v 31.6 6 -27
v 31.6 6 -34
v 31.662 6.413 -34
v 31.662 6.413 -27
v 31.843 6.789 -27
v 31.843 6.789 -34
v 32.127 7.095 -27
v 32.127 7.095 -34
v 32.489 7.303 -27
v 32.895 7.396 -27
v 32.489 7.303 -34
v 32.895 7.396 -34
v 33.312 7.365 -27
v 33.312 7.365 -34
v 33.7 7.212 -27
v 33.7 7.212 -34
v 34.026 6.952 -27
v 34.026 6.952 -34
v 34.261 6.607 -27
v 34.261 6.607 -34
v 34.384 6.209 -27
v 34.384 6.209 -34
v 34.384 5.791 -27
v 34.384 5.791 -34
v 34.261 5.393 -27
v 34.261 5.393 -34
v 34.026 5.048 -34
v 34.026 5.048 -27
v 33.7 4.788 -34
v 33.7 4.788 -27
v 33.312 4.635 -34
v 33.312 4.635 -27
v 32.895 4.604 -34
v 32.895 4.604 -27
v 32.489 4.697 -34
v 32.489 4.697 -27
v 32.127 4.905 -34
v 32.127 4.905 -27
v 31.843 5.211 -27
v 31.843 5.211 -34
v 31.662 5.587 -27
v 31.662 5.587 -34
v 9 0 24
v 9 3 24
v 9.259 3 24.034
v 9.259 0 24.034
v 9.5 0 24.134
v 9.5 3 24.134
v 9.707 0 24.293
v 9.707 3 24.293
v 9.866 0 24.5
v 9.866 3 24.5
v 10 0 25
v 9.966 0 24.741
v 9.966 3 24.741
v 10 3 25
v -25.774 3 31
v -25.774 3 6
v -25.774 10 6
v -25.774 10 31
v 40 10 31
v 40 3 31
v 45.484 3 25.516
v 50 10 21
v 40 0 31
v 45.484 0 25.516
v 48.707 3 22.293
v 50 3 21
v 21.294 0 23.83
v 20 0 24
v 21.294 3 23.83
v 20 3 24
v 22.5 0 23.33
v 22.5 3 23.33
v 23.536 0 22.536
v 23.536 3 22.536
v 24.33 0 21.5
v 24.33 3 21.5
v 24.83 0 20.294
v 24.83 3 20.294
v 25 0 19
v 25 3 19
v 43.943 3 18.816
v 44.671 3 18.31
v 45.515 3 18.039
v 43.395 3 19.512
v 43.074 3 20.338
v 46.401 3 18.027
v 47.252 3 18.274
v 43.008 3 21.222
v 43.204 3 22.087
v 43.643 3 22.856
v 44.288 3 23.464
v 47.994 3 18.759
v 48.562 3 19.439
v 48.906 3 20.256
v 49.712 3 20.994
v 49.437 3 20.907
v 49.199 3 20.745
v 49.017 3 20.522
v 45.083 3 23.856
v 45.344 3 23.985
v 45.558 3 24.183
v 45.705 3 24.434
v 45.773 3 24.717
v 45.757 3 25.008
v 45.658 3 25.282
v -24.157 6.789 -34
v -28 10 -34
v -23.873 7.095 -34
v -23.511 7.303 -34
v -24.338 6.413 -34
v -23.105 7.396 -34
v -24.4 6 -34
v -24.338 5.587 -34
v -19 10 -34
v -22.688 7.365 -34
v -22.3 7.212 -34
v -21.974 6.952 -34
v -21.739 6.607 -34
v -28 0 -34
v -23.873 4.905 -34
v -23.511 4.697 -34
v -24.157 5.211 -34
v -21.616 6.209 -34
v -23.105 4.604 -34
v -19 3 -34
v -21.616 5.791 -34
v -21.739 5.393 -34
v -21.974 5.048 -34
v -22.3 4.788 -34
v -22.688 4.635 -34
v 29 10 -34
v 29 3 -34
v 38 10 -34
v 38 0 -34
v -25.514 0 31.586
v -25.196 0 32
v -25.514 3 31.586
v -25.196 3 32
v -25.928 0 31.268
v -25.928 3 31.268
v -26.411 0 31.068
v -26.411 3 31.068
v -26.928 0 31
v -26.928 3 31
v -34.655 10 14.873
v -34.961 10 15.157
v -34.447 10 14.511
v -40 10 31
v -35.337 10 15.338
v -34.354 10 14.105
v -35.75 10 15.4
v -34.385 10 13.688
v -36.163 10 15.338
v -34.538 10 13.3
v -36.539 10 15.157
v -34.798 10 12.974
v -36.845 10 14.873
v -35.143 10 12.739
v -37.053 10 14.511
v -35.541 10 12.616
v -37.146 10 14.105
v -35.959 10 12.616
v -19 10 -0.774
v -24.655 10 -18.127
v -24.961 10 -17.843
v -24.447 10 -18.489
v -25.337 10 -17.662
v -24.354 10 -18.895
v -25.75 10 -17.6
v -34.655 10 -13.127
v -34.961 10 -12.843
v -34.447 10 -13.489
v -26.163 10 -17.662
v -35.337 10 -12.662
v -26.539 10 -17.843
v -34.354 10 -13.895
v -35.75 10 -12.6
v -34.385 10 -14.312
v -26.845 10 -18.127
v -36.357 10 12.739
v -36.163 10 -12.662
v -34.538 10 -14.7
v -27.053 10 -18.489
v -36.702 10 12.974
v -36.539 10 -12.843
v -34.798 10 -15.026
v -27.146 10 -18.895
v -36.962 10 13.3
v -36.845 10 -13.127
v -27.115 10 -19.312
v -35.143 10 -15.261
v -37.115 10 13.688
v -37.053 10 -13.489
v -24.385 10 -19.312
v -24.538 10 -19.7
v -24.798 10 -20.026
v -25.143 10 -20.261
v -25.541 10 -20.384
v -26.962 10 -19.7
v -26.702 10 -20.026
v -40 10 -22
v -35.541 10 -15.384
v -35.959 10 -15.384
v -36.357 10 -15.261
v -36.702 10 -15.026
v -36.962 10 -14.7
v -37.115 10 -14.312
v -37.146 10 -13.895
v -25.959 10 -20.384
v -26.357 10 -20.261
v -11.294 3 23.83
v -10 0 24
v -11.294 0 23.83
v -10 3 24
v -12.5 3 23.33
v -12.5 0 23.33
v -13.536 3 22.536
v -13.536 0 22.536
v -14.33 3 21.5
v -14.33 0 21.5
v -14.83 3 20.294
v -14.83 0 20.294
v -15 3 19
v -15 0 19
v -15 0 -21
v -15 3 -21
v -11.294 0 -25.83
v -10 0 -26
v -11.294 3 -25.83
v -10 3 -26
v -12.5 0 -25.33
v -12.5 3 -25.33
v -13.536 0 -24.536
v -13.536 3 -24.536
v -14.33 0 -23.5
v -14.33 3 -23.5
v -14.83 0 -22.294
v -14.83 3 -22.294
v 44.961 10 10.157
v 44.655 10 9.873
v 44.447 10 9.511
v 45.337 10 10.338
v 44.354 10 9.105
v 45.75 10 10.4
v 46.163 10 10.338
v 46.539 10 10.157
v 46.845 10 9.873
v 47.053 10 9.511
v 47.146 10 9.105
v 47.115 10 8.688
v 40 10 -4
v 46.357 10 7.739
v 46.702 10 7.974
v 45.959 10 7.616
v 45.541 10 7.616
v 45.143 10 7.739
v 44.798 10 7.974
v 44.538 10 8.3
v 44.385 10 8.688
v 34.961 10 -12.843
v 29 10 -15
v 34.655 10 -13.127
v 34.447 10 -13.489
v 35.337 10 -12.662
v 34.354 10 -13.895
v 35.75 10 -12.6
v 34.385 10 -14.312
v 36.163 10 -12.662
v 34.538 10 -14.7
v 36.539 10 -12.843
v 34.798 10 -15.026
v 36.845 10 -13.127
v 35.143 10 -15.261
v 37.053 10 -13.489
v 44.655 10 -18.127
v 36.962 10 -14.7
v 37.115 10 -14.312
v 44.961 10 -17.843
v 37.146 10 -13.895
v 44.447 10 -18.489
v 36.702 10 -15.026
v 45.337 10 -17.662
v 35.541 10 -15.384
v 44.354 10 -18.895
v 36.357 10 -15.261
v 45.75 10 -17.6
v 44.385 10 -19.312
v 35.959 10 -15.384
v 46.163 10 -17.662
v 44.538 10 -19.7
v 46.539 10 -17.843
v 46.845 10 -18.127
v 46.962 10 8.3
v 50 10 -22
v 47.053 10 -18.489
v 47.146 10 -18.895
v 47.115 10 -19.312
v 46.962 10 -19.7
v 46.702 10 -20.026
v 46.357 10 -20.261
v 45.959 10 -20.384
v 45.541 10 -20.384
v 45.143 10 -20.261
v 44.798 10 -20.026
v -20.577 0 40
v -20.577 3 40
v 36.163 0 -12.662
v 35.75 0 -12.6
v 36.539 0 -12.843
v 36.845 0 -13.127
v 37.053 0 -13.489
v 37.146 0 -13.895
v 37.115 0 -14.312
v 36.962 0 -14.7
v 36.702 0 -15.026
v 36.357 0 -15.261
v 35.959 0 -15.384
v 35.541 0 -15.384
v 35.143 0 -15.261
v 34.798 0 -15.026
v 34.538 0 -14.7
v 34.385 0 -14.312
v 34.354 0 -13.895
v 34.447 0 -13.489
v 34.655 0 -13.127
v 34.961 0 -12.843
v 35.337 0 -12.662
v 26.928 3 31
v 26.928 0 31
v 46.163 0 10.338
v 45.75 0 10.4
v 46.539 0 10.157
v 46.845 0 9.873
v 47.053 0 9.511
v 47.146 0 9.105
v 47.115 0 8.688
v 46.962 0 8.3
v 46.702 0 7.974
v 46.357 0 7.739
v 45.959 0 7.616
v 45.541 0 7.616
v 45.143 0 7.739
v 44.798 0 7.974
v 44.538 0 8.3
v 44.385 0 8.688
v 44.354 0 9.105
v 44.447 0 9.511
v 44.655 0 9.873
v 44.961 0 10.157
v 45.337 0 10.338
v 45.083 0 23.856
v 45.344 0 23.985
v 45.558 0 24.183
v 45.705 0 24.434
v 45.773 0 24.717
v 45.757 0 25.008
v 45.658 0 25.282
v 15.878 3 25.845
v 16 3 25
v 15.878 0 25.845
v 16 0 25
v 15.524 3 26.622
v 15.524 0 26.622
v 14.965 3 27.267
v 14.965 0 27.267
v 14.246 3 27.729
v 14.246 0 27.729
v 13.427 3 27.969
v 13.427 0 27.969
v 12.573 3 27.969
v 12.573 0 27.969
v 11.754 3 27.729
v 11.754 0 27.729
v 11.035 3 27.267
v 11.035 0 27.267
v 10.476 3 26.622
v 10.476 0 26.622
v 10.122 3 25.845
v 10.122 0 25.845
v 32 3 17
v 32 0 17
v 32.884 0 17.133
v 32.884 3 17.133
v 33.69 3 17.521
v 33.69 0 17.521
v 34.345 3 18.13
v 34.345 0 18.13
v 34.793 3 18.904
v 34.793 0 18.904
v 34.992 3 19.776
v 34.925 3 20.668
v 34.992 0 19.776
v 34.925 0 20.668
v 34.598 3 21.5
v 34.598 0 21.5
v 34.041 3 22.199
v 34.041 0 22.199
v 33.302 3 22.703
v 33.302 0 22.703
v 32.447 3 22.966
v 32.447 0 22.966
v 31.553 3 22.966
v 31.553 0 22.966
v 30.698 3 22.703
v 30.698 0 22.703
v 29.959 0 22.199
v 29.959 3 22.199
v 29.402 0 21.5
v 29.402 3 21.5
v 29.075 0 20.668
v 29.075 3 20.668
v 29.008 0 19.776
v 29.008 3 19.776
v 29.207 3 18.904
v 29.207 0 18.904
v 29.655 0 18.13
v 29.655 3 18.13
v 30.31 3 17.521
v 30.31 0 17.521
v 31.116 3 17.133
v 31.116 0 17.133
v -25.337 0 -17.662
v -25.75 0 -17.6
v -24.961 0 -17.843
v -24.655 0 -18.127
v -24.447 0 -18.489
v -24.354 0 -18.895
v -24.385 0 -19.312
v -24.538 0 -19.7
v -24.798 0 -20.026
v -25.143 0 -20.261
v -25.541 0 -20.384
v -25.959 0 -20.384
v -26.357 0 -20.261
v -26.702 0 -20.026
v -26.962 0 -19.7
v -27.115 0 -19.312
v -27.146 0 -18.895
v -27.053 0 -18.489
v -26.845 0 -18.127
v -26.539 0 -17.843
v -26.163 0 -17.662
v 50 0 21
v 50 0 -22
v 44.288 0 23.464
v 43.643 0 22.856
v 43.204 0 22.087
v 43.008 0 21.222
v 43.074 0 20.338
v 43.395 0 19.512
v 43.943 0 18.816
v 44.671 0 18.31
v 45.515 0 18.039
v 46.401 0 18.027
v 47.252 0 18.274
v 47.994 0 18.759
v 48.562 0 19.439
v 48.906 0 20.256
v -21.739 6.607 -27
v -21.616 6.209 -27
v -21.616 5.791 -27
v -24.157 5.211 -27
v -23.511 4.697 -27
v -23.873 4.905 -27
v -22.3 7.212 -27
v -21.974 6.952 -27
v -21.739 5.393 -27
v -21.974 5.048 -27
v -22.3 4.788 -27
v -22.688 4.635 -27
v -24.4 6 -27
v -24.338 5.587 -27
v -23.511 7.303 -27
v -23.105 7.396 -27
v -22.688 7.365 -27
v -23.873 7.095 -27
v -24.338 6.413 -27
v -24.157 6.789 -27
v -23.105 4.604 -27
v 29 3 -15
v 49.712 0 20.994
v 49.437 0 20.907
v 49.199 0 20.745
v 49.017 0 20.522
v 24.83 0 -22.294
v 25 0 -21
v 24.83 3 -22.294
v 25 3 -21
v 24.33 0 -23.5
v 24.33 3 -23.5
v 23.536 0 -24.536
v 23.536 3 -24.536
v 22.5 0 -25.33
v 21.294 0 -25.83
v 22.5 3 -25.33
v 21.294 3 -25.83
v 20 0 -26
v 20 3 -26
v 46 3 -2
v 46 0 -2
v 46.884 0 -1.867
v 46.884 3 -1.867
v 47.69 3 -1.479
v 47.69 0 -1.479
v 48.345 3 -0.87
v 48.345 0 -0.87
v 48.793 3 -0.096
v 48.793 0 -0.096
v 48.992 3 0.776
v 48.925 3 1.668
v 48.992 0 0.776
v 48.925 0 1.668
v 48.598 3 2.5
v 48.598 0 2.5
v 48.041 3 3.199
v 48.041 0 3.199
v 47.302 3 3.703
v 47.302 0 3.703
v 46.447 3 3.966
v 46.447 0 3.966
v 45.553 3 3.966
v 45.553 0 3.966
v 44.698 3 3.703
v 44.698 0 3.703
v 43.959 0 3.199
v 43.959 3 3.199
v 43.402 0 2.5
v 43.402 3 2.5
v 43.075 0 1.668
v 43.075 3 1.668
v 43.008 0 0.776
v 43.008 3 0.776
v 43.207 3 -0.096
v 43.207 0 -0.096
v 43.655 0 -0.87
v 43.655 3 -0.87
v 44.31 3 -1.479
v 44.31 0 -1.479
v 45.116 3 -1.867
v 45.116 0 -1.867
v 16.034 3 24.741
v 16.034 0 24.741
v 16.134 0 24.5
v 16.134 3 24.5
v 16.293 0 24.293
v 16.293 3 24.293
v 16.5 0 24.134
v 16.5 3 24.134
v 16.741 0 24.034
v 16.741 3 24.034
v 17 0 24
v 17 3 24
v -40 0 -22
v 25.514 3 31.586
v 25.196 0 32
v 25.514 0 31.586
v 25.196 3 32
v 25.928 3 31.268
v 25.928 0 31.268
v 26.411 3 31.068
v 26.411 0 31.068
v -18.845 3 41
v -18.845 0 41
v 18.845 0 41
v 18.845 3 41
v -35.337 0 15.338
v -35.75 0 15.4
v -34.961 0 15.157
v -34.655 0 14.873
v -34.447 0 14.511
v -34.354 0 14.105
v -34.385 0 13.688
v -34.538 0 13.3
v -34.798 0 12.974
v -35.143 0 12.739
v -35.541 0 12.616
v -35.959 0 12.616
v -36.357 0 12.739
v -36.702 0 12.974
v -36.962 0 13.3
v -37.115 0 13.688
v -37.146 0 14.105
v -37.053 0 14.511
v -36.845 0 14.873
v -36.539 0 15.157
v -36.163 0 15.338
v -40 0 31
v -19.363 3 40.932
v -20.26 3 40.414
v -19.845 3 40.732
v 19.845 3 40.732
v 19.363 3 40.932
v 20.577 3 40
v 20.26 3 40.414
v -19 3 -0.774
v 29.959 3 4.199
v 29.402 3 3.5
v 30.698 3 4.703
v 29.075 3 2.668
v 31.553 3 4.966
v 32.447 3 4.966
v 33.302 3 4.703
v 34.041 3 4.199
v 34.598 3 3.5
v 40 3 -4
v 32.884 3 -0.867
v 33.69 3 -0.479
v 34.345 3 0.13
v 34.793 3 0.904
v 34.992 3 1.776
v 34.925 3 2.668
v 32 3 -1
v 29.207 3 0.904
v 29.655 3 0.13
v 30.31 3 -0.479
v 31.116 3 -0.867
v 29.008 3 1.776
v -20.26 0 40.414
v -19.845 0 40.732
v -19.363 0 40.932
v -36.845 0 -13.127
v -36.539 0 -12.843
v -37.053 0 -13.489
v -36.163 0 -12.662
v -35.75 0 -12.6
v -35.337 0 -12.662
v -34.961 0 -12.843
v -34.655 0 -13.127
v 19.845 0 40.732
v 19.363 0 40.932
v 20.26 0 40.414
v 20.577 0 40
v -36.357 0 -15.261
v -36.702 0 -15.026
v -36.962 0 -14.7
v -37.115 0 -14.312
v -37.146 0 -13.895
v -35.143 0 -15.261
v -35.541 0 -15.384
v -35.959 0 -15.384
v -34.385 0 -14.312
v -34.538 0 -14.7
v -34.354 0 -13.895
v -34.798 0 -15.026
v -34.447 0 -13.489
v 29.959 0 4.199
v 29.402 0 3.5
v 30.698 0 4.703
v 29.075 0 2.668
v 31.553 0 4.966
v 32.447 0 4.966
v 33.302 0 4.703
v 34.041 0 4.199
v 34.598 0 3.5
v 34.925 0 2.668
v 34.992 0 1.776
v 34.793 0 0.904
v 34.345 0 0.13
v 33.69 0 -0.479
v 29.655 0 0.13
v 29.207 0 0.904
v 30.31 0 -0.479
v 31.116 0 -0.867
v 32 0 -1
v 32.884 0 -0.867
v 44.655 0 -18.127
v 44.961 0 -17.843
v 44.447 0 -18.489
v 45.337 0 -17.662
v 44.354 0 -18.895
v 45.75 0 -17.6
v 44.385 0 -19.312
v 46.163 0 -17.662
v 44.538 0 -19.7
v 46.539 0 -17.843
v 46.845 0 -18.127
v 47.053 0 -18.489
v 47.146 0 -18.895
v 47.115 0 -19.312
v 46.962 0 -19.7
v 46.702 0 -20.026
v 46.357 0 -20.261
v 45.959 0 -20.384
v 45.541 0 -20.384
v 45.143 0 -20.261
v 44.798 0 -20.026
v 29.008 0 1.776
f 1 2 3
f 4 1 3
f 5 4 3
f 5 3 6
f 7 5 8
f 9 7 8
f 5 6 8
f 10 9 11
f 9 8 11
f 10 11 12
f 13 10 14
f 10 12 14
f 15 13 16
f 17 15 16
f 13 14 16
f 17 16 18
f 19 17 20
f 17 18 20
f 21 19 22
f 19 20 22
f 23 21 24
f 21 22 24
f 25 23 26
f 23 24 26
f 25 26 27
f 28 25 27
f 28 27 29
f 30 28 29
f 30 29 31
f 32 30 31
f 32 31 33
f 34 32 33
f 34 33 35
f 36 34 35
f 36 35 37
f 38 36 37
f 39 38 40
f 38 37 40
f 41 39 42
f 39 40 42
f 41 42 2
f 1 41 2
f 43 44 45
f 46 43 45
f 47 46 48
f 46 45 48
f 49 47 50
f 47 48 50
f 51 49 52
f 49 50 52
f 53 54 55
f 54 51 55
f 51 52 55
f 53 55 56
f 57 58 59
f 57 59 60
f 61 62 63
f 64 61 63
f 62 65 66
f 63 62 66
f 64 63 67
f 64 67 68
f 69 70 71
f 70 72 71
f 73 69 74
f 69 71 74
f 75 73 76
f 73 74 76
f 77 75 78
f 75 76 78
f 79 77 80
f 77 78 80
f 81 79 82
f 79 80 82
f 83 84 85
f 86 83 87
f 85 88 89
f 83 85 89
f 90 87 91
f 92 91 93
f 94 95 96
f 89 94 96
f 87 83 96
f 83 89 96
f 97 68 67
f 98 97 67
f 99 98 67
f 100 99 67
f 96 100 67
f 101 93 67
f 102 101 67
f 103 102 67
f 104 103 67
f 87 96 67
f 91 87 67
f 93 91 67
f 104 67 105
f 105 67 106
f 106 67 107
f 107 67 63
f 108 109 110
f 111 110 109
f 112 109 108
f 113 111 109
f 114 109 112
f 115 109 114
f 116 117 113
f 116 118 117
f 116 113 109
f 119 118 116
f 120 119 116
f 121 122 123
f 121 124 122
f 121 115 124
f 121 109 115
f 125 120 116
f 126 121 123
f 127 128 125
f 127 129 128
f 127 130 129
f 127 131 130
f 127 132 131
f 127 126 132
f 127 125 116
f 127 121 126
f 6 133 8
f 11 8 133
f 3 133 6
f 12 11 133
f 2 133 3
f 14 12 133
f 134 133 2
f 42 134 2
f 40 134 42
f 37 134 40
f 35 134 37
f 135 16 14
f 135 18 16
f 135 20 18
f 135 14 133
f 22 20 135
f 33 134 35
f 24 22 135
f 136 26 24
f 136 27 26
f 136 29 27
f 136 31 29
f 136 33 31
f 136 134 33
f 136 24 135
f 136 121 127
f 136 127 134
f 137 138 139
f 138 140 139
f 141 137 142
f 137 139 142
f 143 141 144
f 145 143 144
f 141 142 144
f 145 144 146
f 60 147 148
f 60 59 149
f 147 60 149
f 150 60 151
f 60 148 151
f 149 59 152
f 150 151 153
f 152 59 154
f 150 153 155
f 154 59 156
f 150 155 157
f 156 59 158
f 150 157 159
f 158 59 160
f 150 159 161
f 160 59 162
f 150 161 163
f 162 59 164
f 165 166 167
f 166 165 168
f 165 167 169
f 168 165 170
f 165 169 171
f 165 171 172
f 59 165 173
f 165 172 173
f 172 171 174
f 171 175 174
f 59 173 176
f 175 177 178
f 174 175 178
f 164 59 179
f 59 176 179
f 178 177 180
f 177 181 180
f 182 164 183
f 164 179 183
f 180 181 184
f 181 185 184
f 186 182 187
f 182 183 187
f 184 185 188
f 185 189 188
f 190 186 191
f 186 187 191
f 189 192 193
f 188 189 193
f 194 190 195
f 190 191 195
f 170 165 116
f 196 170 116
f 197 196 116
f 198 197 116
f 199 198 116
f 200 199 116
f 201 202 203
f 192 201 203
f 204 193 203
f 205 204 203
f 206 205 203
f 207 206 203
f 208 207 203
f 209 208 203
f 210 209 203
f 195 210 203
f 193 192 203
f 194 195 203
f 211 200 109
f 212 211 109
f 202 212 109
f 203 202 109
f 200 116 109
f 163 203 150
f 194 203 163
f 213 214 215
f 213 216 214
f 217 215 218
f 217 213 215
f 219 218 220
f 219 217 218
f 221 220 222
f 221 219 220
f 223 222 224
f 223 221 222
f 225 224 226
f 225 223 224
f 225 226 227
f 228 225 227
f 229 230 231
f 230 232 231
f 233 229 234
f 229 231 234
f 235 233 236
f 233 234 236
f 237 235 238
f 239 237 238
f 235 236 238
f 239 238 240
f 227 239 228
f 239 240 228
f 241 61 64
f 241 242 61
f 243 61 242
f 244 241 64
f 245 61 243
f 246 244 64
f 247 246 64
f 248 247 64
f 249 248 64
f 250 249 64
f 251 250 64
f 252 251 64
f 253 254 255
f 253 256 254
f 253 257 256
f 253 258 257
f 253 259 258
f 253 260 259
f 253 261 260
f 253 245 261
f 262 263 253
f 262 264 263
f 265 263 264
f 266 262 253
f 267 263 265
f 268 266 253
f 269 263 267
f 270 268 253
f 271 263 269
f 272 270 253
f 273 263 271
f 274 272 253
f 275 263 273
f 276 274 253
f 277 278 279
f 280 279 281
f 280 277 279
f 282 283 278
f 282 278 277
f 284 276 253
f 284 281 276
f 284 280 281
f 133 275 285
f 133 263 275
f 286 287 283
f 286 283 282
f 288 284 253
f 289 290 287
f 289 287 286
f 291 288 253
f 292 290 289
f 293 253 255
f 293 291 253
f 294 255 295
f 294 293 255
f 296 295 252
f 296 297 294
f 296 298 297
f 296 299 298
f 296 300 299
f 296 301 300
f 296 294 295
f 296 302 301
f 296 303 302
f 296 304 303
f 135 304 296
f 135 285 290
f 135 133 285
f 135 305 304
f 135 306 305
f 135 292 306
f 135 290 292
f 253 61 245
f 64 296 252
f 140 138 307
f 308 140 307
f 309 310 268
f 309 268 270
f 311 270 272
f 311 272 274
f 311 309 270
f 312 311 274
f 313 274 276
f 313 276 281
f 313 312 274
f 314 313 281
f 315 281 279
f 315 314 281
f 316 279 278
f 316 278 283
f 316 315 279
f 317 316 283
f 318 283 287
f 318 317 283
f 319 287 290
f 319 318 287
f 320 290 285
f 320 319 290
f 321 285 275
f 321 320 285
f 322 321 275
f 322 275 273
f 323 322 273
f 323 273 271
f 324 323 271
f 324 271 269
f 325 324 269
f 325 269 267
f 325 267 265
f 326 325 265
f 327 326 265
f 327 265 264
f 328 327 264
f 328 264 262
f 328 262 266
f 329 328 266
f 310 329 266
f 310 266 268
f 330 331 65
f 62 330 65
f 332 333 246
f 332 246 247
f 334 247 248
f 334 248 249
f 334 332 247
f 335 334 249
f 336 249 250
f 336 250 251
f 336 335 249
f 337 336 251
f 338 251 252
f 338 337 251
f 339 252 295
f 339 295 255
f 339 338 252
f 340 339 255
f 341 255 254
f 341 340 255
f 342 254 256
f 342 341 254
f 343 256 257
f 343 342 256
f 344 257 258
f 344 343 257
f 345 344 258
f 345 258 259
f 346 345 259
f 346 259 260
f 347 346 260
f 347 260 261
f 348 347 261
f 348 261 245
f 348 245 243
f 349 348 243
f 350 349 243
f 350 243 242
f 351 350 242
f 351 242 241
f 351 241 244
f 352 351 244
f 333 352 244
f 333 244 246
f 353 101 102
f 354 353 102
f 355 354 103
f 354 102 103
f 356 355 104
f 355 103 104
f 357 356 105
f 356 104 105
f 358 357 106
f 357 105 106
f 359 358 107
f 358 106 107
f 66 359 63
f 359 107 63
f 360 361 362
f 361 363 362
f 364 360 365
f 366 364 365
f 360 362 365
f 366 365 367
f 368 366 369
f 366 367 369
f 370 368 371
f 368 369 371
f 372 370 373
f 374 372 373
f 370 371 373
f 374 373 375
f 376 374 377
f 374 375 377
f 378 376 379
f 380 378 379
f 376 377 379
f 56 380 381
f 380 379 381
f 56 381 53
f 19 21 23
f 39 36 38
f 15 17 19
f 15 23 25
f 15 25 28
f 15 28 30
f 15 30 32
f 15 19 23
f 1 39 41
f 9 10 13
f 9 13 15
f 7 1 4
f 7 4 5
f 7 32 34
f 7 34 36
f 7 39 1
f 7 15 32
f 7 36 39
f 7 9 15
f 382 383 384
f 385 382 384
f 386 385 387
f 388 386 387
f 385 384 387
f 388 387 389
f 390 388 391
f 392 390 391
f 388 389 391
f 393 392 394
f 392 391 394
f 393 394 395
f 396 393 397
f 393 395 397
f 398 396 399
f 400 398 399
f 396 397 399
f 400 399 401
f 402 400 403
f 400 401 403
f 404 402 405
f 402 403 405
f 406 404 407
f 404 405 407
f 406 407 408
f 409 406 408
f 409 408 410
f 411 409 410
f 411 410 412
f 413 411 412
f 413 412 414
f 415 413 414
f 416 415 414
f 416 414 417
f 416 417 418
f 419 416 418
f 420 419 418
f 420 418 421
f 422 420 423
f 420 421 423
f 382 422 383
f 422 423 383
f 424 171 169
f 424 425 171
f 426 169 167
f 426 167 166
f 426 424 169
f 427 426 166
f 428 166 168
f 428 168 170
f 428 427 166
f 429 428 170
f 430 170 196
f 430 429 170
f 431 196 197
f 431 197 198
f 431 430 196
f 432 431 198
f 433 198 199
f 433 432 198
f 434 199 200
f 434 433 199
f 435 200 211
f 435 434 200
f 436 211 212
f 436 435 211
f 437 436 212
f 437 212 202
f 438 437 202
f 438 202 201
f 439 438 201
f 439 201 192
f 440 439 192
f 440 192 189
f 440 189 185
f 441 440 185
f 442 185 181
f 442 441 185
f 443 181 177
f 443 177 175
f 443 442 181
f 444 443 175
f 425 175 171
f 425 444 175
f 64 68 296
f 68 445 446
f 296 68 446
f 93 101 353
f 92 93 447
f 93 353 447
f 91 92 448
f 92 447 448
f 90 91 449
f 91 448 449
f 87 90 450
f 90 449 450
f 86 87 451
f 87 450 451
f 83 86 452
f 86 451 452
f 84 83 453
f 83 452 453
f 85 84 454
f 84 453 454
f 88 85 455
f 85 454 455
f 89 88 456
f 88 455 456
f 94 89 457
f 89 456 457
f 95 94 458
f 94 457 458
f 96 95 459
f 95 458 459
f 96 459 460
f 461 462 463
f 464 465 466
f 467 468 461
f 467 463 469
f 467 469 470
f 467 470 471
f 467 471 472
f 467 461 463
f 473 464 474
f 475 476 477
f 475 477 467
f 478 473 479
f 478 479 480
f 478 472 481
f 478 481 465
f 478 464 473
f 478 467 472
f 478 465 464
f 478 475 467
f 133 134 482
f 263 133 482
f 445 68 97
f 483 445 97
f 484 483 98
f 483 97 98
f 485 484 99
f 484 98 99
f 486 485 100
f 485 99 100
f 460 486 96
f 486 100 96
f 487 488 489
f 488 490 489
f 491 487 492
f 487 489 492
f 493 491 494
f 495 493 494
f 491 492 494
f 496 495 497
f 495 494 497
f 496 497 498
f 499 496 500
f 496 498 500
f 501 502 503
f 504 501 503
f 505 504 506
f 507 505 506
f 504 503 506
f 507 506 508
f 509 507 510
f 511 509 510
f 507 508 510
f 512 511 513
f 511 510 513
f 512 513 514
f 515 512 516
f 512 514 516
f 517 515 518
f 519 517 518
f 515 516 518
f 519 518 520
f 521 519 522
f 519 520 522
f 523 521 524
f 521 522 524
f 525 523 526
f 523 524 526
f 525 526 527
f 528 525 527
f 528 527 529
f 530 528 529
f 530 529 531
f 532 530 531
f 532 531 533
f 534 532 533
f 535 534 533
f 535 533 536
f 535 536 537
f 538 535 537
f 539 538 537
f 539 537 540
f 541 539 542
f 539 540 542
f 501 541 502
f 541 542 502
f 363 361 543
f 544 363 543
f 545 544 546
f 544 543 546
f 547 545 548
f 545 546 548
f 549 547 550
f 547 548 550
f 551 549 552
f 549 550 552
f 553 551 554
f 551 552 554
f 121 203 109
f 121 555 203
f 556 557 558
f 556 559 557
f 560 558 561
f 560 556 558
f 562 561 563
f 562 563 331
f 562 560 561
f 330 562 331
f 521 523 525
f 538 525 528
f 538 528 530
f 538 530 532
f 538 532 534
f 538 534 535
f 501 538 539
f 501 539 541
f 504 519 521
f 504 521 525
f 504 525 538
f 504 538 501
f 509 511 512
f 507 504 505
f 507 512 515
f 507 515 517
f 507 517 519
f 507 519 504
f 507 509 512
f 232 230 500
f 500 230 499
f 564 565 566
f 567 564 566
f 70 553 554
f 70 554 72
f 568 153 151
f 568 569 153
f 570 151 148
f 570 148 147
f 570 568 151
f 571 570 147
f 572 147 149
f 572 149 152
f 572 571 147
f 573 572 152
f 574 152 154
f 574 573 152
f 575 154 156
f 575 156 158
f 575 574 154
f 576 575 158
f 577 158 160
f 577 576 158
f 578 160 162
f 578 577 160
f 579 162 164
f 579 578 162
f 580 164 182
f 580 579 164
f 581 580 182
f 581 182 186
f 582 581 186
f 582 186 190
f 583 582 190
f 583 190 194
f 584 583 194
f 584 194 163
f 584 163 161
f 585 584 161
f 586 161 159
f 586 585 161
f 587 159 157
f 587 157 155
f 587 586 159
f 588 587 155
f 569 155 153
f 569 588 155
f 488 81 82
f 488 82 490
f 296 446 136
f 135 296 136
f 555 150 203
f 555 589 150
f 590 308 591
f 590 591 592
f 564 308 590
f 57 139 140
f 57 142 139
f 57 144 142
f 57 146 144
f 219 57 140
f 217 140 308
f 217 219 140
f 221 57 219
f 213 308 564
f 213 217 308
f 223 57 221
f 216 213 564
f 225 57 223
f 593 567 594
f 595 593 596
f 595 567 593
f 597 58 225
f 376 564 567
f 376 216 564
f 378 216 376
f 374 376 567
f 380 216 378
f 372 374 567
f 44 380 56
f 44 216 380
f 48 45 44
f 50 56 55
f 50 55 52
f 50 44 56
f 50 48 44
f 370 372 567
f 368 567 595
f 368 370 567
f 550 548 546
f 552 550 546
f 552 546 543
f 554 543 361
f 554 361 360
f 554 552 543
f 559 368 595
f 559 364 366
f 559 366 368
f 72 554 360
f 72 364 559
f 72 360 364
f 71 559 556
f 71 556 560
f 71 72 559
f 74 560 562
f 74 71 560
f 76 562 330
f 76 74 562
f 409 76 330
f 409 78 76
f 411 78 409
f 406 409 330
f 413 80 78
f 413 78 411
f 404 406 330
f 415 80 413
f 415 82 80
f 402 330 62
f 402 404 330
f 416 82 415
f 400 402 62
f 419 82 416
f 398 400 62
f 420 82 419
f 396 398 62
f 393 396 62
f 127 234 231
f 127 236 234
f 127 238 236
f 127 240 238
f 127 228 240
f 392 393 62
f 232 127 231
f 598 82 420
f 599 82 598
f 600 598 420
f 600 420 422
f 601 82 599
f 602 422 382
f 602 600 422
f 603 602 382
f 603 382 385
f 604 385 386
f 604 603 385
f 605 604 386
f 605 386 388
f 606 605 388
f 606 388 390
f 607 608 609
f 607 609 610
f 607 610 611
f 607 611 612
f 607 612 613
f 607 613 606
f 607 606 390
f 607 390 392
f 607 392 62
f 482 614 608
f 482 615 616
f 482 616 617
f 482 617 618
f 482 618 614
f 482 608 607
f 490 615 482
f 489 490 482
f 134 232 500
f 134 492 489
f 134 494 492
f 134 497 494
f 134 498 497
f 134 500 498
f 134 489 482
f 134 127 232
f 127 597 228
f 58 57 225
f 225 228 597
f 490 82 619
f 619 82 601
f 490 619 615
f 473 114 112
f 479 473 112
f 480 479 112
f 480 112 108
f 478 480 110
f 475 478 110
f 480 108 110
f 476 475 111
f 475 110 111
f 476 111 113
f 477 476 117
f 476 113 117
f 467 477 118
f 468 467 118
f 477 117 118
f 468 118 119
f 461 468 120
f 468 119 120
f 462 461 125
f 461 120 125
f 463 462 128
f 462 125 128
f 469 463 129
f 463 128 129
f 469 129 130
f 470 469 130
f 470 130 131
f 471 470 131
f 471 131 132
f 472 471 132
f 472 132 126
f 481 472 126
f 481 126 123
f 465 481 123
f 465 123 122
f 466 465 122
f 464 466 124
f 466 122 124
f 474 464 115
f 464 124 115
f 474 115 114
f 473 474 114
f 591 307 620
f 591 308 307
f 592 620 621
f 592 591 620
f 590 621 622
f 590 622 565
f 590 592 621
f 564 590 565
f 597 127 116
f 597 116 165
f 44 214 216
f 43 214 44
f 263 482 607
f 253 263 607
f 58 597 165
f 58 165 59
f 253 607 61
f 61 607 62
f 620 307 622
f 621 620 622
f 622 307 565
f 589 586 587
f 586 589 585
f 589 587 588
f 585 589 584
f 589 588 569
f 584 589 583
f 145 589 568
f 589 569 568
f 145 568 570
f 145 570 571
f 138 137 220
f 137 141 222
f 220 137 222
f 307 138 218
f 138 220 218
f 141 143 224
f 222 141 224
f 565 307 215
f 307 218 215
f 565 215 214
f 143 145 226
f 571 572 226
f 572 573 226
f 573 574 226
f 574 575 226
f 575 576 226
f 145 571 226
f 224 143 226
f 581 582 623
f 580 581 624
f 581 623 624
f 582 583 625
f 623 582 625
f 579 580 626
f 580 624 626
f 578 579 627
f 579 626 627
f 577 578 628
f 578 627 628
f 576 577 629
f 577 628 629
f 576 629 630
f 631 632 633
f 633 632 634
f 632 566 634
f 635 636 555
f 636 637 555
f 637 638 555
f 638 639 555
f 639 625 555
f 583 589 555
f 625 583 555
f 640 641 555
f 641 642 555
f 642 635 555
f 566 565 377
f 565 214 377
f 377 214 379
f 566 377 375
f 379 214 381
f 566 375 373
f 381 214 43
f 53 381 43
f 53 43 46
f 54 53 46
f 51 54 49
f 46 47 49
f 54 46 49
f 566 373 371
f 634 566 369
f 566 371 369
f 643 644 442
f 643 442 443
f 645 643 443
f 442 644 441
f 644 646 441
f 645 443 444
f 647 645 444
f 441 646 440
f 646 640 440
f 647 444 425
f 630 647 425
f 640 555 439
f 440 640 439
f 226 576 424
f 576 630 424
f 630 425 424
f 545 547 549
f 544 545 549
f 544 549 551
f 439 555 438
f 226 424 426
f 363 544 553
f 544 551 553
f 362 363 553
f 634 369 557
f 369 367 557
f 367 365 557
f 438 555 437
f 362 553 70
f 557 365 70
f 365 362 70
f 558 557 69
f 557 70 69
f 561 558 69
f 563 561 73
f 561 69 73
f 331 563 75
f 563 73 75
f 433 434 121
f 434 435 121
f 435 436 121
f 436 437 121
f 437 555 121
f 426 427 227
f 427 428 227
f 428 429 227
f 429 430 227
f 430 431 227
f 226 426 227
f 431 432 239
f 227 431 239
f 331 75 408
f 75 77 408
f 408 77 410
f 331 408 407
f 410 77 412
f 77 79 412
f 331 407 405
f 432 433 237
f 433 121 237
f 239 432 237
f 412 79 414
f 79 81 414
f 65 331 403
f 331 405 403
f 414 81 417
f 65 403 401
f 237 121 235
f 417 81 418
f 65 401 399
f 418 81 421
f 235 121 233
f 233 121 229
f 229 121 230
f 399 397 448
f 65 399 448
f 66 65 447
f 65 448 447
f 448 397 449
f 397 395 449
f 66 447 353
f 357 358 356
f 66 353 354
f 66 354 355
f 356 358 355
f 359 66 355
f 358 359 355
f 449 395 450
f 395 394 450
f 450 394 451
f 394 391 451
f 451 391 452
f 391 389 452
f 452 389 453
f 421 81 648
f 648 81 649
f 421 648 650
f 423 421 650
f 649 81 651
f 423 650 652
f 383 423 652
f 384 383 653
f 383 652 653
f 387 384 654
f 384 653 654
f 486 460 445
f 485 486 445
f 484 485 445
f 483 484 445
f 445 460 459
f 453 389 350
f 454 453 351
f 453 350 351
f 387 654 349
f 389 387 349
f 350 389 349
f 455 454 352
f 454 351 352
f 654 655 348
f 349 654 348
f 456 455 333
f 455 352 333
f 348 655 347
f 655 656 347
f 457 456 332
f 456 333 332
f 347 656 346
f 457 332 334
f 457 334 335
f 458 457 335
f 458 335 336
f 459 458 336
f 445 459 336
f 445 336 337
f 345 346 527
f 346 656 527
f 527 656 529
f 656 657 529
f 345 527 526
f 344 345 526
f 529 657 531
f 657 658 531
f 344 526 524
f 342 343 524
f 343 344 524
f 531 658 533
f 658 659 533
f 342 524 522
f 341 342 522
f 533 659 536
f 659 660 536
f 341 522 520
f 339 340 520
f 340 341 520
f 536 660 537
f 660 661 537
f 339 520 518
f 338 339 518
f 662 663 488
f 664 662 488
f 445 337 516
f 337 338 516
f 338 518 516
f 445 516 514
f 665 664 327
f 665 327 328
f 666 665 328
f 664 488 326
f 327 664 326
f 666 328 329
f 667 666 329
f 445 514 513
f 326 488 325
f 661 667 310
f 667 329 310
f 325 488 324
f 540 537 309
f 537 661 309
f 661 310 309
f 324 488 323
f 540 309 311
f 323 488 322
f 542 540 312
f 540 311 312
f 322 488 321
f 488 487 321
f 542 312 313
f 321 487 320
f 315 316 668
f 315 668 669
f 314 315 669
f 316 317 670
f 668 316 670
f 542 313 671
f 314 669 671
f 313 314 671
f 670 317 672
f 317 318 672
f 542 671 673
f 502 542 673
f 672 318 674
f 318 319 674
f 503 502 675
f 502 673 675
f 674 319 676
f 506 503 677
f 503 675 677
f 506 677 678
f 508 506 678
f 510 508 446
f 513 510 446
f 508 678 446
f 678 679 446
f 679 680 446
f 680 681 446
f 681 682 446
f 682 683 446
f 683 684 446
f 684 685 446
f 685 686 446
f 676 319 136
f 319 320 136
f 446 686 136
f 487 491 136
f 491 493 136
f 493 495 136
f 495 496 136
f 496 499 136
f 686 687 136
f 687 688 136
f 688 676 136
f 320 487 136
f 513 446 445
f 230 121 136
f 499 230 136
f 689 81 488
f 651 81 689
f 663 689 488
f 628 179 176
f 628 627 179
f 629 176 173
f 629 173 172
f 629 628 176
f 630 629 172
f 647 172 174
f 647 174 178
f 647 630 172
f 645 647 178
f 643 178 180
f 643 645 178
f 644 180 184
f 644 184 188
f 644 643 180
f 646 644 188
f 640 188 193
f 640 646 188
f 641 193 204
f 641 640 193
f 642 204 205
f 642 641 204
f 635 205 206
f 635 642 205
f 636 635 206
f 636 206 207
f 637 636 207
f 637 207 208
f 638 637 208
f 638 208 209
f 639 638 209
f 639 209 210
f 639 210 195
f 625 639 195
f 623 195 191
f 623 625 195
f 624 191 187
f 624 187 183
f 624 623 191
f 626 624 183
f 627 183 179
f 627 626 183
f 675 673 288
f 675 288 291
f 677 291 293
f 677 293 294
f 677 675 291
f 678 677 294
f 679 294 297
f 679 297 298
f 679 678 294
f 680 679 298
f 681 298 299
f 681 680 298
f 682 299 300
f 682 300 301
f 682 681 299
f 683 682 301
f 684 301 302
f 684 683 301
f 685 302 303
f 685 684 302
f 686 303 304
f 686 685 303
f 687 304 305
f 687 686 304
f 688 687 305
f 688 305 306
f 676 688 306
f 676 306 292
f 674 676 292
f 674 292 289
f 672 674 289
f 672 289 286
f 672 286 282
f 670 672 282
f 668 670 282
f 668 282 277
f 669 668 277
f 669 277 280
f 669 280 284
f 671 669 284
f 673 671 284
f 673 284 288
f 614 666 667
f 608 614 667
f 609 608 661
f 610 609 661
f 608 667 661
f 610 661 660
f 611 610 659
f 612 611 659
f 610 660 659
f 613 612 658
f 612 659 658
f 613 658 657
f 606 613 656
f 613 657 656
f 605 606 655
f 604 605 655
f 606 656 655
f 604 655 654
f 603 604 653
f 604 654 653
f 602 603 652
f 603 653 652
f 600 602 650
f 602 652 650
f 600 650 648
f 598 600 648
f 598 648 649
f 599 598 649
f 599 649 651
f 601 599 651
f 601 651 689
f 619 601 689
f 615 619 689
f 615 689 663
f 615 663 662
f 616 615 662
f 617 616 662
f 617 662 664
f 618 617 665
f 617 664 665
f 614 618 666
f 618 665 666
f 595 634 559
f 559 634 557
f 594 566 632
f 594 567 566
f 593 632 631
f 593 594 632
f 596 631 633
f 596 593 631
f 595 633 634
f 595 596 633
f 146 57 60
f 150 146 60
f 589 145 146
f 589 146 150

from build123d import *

# Parameters (mm, degrees)
SKETCH_1_R          = 1.4
SKETCH_1_W          = 40
SKETCH_1_H          = 50
EXTRUDE_1_DEPTH     = 3
SKETCH_2_R          = 1.4
EXTRUDE_2_DEPTH     = 7
SKETCH_3_R          = 1.4
CUT_EXTRUDE_1_DEPTH = 7
SKETCH_4_R          = 3
CUT_EXTRUDE_2_DEPTH = 3
FILLET_1_R          = 1
FILLET_2_R          = 2
FILLET_3_R          = 5


with BuildPart() as part:
    # 草图1 → 凸台-拉伸1 (new body)
    with BuildSketch(Plane(origin=(0, 0, 0), x_dir=(1, 0, 0), z_dir=(0, 1, 0))):
        Polygon((-40, 22), (-40, -31), (-25.773502692, -31), (-20, -41), (20, -41), (25.773502692, -31), (40, -31), (50, -21), (50, 22), (38, 34), (-28, 34), align=None)
        with Locations(Location((-35.75, 14, 0), (0, 0, 270))):
            Circle(SKETCH_1_R, mode=Mode.SUBTRACT)
        with Locations(Location((35.75, 14, 0), (0, 0, 270))):
            Circle(SKETCH_1_R, mode=Mode.SUBTRACT)
        with Locations(Location((-35.75, -14, 0), (0, 0, 270))):
            Circle(SKETCH_1_R, mode=Mode.SUBTRACT)
        with Locations(Location((45.75, 19, 0), (0, 0, 270))):
            Circle(SKETCH_1_R, mode=Mode.SUBTRACT)
        with Locations(Location((45.75, -9, 0), (0, 0, 270))):
            Circle(SKETCH_1_R, mode=Mode.SUBTRACT)
        with Locations(Location((-25.75, 19, 0), (0, 0, 270))):
            Circle(SKETCH_1_R, mode=Mode.SUBTRACT)
        with Locations((5, 1)):
            Rectangle(SKETCH_1_W, SKETCH_1_H, mode=Mode.SUBTRACT)
    extrude(amount=EXTRUDE_1_DEPTH)

    # 草图2 → 凸台-拉伸2 (add)
    # profile 1 of 2: a face of its own
    with BuildSketch(Plane(origin=(0, 3, 0), x_dir=(1, 0, 0), z_dir=(0, 1, 0))):
        Polygon((-19, 34), (-19, 0.773502692), (-25.773502692, -6), (-25.773502692, -31), (-40, -31), (-40, 22), (-28, 34), align=None)
        with Locations(Location((-35.75, -14, 0), (0, 0, 270))):
            Circle(SKETCH_2_R, mode=Mode.SUBTRACT)
        with Locations(Location((-35.75, 14, 0), (0, 0, 270))):
            Circle(SKETCH_2_R, mode=Mode.SUBTRACT)
        with Locations(Location((-25.75, 19, 0), (0, 0, 270))):
            Circle(SKETCH_2_R, mode=Mode.SUBTRACT)
    # profile 2 of 2: a face of its own
    with BuildSketch(Plane(origin=(0, 3, 0), x_dir=(1, 0, 0), z_dir=(0, 1, 0))):
        Polygon((29, 34), (29, 15), (40, 4), (40, -31), (50, -21), (50, 22), (38, 34), align=None)
        with Locations(Location((45.75, -9, 0), (0, 0, 270))):
            Circle(SKETCH_2_R, mode=Mode.SUBTRACT)
        with Locations(Location((45.75, 19, 0), (0, 0, 270))):
            Circle(SKETCH_2_R, mode=Mode.SUBTRACT)
        with Locations(Location((35.75, 14, 0), (0, 0, 270))):
            Circle(SKETCH_2_R, mode=Mode.SUBTRACT)
    extrude(amount=EXTRUDE_2_DEPTH)

    # 草图3 → 切除-拉伸1 (cut)
    with BuildSketch(Plane(origin=(0, 0, -34), x_dir=(-1, 0, 0), z_dir=(0, 0, -1))):
        with Locations((-33, 6)):
            Circle(SKETCH_3_R)
        with Locations((23, 6)):
            Circle(SKETCH_3_R)
    extrude(amount=-CUT_EXTRUDE_1_DEPTH, mode=Mode.SUBTRACT)

    # 草图4 → 切除-拉伸2 (cut)
    with BuildSketch(Plane.XZ):
        with Locations((46, 21)):
            Circle(SKETCH_4_R)
        with Locations(Location((46, 1, 0), (0, 0, 270))):
            Circle(SKETCH_4_R)
        with Locations(Location((32, 20, 0), (0, 0, 270))):
            Circle(SKETCH_4_R)
        with Locations(Location((32, 2, 0), (0, 0, 270))):
            Circle(SKETCH_4_R)
        with Locations((13, 25)):
            Circle(SKETCH_4_R)
    extrude(amount=-CUT_EXTRUDE_2_DEPTH, mode=Mode.SUBTRACT)

    # 圆角1
    # the kernel refuses this fillet: 1 mm, written as the material it takes off along each edge
    with BuildSketch(Plane(origin=(47.292893219, 3, 23.707106781), x_dir=(-0.9977260233446211, 0, 0.0674001657336884), z_dir=(0, -1, 0))) as fillet_1_piece_1:
        with BuildLine():
            CenterArc((2.584152116, -0.929364034), FILLET_1_R, 111.664104493, 117.20057038)
            Line((1.926312394, -1.682521985), (1.913155599, -1.697585144))
            Line((1.913155599, -1.697585144), (-0.013156794, -0.015063159))
            Line((-0.013156794, -0.015063159), (0.007383292, 0.018587281))
            ThreePointArc((0.007383292, 0.018587281), (1.107493764, -0.191907899), (2.207604236, 0.018587281))
            Line((2.207604236, 0.018587281), (2.214987528, 0))
        make_face()
    extrude(amount=9.394118228, mode=Mode.SUBTRACT)
    with BuildSketch(Plane(origin=(48.707106781, 3, 22.292893219), x_dir=(0.09729861673044447, 0, -0.9952552331851072), z_dir=(0, -1, 0))) as fillet_1_piece_2:
        with BuildLine():
            CenterArc((2.387842326, 0.940019638), FILLET_1_R, 167.235610317, 82.819244219)
            Line((1.412555464, 1.16096202), (1.393049727, 1.165380868))
            ThreePointArc((1.393049727, 1.165380868), (0.693578708, 0.595932055), (-0.012699024, 0.015451045))
            Line((-0.012699024, 0.015451045), (0.006822407, -0.018800393))
            ThreePointArc((0.006822407, -0.018800393), (1.023360997, 0.159941087), (2.039899587, -0.018800393))
            Line((2.039899587, -0.018800393), (2.046721994, 0))
        make_face()
    extrude(amount=8.116804984, mode=Mode.SUBTRACT)
    with BuildSketch(Plane(origin=(10.171572875, 5.928932188, 24), x_dir=(-1, 0, 0), z_dir=(0, -1, 0))) as fillet_1_piece_3:
        with BuildLine():
            CenterArc((1.171572875, -1), FILLET_1_R, 90, 90)
            Line((0.171572875, -1), (0.151572875, -1))
            ThreePointArc((0.151572875, -1), (0.108656583, -0.496076103), (-0.018856181, -0.006666667))
            Line((-0.018856181, -0.006666667), (0, 0.02))
            Line((0, 0.02), (1.171572875, 0.02))
            Line((1.171572875, 0.02), (1.171572875, 0))
        make_face()
    extrude(amount=8.857864376, mode=Mode.SUBTRACT)
    with BuildSketch(Plane(origin=(15.828427125, 5.928932188, 24), x_dir=(0.1691019787257596, 0, 0.9855985596534894), z_dir=(0, -1, 0))) as fillet_1_piece_4:
        with BuildLine():
            CenterArc((1.183713851, -0.98559856), FILLET_1_R, 99.735610317, 90)
            Line((0.198115291, -1.154700538), (0.17840332, -1.158082578))
            Line((0.17840332, -1.158082578), (-0.019711971, -0.00338204))
            Line((-0.019711971, -0.00338204), (0.00338204, 0.019711971))
            ThreePointArc((0.00338204, 0.019711971), (0.507305936, -0.023204321), (1.011229833, 0.019711971))
            Line((1.011229833, 0.019711971), (1.014611872, 0))
        make_face()
    extrude(amount=8.857864376, mode=Mode.SUBTRACT)

    # 圆角2
    fillet_2_edges = [part.edges().sort_by_distance(p)[0] for p in [
        (25.773502692, 1.5, 31),
        (20, 1.5, 41),
        (-20, 1.5, 41),
        (-25.773502692, 1.5, 31),
    ]]
    fillet(fillet_2_edges, radius=FILLET_2_R)

    # 圆角3
    fillet_3_edges = [part.edges().sort_by_distance(p)[0] for p in [
        (-15, 1.5, -26),
        (-15, 1.5, 24),
        (25, 1.5, 24),
        (25, 1.5, -26),
    ]]
    fillet(fillet_3_edges, radius=FILLET_3_R)


solid = part.part
